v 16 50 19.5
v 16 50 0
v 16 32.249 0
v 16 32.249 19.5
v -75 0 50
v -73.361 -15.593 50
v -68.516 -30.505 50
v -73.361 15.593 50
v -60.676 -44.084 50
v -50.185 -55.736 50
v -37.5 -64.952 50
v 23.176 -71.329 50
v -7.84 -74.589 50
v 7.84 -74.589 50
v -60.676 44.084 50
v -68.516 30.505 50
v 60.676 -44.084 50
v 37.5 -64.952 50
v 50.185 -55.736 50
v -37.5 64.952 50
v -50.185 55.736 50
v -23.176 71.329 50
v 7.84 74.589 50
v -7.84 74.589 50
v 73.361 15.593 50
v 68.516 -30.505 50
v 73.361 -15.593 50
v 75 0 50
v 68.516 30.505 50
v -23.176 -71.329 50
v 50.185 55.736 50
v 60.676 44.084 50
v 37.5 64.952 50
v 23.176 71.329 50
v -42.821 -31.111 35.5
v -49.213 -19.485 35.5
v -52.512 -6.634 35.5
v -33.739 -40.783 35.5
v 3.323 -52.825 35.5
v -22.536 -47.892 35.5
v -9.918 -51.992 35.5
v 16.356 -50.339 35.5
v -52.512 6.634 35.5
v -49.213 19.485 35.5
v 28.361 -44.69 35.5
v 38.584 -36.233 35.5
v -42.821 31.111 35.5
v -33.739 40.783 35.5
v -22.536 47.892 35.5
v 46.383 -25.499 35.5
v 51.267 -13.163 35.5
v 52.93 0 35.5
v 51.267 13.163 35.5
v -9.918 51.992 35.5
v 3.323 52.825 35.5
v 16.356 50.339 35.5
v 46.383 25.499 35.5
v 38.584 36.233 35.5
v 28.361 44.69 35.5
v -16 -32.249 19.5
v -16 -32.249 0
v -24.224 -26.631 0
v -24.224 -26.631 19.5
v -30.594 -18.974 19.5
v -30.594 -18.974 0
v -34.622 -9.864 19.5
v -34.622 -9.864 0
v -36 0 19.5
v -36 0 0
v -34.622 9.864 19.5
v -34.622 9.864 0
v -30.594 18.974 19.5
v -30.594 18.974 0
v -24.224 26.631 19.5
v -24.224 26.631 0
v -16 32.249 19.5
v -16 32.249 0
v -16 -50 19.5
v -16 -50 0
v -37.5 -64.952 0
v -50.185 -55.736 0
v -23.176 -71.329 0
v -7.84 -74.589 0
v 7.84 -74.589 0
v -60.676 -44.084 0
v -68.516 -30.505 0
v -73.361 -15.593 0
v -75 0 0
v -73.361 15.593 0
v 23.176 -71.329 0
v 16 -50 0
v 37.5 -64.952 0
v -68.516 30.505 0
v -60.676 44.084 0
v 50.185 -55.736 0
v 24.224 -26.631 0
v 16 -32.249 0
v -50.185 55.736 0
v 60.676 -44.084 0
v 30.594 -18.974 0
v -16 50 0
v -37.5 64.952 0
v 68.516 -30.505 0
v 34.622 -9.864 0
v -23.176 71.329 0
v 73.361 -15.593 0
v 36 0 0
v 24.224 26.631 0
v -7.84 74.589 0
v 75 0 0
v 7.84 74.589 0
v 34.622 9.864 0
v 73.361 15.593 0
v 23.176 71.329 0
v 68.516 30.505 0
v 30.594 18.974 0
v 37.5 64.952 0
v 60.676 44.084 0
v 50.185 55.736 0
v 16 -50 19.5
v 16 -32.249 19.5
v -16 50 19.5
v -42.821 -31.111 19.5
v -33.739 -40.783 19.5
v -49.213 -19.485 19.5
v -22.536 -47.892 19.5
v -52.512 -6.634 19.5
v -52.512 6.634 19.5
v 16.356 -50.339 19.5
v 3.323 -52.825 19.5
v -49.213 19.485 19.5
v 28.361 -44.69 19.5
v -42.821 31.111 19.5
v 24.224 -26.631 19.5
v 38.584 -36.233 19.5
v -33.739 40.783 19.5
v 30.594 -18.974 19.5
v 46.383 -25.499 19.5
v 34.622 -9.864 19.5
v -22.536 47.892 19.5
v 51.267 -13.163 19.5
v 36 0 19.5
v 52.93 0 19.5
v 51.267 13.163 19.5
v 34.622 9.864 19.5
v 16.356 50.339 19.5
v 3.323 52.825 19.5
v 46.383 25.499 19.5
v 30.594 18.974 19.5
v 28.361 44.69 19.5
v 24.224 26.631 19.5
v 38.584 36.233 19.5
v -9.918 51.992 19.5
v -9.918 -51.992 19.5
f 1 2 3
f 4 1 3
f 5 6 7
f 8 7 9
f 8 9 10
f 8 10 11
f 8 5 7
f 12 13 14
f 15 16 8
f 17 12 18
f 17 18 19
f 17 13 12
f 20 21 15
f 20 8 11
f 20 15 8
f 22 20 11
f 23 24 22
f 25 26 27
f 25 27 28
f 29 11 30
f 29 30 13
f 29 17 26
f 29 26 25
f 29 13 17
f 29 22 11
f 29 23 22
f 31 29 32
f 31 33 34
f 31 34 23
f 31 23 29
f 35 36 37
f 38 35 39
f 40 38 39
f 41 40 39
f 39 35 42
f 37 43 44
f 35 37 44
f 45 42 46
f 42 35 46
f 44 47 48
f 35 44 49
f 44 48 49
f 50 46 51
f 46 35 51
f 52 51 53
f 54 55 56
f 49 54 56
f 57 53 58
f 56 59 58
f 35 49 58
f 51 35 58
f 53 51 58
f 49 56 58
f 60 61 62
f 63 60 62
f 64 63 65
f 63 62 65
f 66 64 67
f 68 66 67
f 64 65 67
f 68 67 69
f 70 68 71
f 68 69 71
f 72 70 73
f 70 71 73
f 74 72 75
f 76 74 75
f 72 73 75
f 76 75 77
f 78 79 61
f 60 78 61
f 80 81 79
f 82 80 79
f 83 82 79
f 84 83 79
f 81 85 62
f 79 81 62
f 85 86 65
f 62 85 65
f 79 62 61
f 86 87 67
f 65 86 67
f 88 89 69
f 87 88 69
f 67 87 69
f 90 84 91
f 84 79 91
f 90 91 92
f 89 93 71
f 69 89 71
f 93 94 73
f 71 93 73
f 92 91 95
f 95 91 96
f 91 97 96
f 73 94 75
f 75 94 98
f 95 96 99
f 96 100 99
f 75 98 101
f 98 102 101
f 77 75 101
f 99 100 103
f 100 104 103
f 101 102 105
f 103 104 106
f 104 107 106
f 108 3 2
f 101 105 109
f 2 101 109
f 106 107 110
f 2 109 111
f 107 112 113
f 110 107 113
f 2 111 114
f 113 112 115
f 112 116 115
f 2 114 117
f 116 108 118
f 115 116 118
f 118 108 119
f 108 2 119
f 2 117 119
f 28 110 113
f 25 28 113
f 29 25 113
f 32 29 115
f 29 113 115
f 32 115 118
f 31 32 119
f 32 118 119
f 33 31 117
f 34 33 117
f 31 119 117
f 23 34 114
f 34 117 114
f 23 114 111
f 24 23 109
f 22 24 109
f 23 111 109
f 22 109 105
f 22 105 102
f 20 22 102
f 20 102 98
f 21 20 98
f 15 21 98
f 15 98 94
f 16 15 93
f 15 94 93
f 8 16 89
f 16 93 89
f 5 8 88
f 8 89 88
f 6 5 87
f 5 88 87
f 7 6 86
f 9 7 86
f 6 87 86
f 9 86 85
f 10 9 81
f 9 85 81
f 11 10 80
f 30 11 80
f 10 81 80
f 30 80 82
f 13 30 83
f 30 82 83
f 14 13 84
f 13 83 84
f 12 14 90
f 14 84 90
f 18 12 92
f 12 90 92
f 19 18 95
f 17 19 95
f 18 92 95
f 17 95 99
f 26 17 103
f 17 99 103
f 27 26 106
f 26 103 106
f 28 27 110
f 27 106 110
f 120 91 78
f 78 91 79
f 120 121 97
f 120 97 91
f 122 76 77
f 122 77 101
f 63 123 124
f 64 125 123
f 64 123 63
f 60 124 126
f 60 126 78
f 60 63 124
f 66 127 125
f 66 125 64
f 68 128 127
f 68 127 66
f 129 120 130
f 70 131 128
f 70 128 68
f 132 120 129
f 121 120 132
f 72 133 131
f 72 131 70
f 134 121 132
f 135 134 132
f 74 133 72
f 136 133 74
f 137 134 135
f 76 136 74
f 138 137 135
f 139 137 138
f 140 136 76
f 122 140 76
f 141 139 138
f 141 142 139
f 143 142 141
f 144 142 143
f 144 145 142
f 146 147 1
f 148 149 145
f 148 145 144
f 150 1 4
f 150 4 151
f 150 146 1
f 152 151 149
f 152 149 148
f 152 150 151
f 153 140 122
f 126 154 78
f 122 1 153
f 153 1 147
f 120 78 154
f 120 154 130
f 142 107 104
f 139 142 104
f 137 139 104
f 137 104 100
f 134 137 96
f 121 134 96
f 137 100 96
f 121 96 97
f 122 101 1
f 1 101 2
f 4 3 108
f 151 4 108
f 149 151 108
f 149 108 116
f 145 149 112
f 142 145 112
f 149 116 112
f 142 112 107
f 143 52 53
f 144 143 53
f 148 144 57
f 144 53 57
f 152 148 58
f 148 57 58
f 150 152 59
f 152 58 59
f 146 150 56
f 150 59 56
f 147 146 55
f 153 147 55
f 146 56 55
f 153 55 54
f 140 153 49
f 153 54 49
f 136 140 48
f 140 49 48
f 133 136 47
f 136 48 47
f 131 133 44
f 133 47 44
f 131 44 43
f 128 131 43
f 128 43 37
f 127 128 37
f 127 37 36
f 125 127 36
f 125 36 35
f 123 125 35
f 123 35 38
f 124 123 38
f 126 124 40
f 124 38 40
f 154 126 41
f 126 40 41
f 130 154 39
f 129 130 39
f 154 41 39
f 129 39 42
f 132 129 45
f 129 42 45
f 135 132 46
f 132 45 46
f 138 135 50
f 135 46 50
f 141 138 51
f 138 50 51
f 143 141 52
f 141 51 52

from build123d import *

# Parameters (mm, degrees)
F0_R     = 75
F1_DEPTH = 50
F3_DEPTH = 35.5
F5_R     = 52.9296402023
F6_DEPTH = 16


with BuildPart() as f1:
    # F0 (on Top) → F1 (new body)
    with BuildSketch(Plane.XY):
        Circle(F0_R)
    extrude(amount=F1_DEPTH)

    # F2 (on face) → F3 (cut)
    with BuildSketch(Plane(origin=(0, 0, 0), x_dir=(1, 0, 0), z_dir=(0, 0, -1))):
        with BuildLine():
            ThreePointArc((16, -32.2490309932), (30.5941170816, -18.973665961), (36, 0))
            ThreePointArc((36, 0), (30.5941170816, 18.973665961), (16, 32.2490309932))
            Line((16, 32.2490309932), (16, 28.5))
            Line((16, 28.5), (-16, 28.5))
            Line((-16, 28.5), (-16, 32.2490309932))
            ThreePointArc((-16, 32.2490309932), (-36, 0), (-16, -32.2490309932))
            Line((-16, -32.2490309932), (-16, -28.5))
            Line((-16, -28.5), (16, -28.5))
            Line((16, -28.5), (16, -32.2490309932))
        make_face()
        with BuildLine():
            Line((16, 28.5), (16, 32.2490309932))
            ThreePointArc((16, 32.2490309932), (0, 36), (-16, 32.2490309932))
            Line((-16, 32.2490309932), (-16, 28.5))
            Line((-16, 28.5), (16, 28.5))
        make_face()
        with BuildLine():
            ThreePointArc((-16, 32.2490309932), (0, 36), (16, 32.2490309932))
            Line((16, 32.2490309932), (16, 50))
            Line((16, 50), (-16, 50))
            Line((-16, 50), (-16, 32.2490309932))
        make_face()
        with BuildLine():
            Line((16, -50), (16, -32.2490309932))
            ThreePointArc((16, -32.2490309932), (0, -36), (-16, -32.2490309932))
            Line((-16, -32.2490309932), (-16, -50))
            Line((-16, -50), (16, -50))
        make_face()
        with BuildLine():
            ThreePointArc((-16, -32.2490309932), (0, -36), (16, -32.2490309932))
            Line((16, -32.2490309932), (16, -28.5))
            Line((16, -28.5), (-16, -28.5))
            Line((-16, -28.5), (-16, -32.2490309932))
        make_face()
    extrude(amount=-F3_DEPTH, mode=Mode.SUBTRACT)

    # F5 (on offset) → F6 (cut)
    with BuildSketch(Plane.XY.offset(35.5)):
        Circle(F5_R)
    extrude(amount=-F6_DEPTH, mode=Mode.SUBTRACT)


solid = f1.part
